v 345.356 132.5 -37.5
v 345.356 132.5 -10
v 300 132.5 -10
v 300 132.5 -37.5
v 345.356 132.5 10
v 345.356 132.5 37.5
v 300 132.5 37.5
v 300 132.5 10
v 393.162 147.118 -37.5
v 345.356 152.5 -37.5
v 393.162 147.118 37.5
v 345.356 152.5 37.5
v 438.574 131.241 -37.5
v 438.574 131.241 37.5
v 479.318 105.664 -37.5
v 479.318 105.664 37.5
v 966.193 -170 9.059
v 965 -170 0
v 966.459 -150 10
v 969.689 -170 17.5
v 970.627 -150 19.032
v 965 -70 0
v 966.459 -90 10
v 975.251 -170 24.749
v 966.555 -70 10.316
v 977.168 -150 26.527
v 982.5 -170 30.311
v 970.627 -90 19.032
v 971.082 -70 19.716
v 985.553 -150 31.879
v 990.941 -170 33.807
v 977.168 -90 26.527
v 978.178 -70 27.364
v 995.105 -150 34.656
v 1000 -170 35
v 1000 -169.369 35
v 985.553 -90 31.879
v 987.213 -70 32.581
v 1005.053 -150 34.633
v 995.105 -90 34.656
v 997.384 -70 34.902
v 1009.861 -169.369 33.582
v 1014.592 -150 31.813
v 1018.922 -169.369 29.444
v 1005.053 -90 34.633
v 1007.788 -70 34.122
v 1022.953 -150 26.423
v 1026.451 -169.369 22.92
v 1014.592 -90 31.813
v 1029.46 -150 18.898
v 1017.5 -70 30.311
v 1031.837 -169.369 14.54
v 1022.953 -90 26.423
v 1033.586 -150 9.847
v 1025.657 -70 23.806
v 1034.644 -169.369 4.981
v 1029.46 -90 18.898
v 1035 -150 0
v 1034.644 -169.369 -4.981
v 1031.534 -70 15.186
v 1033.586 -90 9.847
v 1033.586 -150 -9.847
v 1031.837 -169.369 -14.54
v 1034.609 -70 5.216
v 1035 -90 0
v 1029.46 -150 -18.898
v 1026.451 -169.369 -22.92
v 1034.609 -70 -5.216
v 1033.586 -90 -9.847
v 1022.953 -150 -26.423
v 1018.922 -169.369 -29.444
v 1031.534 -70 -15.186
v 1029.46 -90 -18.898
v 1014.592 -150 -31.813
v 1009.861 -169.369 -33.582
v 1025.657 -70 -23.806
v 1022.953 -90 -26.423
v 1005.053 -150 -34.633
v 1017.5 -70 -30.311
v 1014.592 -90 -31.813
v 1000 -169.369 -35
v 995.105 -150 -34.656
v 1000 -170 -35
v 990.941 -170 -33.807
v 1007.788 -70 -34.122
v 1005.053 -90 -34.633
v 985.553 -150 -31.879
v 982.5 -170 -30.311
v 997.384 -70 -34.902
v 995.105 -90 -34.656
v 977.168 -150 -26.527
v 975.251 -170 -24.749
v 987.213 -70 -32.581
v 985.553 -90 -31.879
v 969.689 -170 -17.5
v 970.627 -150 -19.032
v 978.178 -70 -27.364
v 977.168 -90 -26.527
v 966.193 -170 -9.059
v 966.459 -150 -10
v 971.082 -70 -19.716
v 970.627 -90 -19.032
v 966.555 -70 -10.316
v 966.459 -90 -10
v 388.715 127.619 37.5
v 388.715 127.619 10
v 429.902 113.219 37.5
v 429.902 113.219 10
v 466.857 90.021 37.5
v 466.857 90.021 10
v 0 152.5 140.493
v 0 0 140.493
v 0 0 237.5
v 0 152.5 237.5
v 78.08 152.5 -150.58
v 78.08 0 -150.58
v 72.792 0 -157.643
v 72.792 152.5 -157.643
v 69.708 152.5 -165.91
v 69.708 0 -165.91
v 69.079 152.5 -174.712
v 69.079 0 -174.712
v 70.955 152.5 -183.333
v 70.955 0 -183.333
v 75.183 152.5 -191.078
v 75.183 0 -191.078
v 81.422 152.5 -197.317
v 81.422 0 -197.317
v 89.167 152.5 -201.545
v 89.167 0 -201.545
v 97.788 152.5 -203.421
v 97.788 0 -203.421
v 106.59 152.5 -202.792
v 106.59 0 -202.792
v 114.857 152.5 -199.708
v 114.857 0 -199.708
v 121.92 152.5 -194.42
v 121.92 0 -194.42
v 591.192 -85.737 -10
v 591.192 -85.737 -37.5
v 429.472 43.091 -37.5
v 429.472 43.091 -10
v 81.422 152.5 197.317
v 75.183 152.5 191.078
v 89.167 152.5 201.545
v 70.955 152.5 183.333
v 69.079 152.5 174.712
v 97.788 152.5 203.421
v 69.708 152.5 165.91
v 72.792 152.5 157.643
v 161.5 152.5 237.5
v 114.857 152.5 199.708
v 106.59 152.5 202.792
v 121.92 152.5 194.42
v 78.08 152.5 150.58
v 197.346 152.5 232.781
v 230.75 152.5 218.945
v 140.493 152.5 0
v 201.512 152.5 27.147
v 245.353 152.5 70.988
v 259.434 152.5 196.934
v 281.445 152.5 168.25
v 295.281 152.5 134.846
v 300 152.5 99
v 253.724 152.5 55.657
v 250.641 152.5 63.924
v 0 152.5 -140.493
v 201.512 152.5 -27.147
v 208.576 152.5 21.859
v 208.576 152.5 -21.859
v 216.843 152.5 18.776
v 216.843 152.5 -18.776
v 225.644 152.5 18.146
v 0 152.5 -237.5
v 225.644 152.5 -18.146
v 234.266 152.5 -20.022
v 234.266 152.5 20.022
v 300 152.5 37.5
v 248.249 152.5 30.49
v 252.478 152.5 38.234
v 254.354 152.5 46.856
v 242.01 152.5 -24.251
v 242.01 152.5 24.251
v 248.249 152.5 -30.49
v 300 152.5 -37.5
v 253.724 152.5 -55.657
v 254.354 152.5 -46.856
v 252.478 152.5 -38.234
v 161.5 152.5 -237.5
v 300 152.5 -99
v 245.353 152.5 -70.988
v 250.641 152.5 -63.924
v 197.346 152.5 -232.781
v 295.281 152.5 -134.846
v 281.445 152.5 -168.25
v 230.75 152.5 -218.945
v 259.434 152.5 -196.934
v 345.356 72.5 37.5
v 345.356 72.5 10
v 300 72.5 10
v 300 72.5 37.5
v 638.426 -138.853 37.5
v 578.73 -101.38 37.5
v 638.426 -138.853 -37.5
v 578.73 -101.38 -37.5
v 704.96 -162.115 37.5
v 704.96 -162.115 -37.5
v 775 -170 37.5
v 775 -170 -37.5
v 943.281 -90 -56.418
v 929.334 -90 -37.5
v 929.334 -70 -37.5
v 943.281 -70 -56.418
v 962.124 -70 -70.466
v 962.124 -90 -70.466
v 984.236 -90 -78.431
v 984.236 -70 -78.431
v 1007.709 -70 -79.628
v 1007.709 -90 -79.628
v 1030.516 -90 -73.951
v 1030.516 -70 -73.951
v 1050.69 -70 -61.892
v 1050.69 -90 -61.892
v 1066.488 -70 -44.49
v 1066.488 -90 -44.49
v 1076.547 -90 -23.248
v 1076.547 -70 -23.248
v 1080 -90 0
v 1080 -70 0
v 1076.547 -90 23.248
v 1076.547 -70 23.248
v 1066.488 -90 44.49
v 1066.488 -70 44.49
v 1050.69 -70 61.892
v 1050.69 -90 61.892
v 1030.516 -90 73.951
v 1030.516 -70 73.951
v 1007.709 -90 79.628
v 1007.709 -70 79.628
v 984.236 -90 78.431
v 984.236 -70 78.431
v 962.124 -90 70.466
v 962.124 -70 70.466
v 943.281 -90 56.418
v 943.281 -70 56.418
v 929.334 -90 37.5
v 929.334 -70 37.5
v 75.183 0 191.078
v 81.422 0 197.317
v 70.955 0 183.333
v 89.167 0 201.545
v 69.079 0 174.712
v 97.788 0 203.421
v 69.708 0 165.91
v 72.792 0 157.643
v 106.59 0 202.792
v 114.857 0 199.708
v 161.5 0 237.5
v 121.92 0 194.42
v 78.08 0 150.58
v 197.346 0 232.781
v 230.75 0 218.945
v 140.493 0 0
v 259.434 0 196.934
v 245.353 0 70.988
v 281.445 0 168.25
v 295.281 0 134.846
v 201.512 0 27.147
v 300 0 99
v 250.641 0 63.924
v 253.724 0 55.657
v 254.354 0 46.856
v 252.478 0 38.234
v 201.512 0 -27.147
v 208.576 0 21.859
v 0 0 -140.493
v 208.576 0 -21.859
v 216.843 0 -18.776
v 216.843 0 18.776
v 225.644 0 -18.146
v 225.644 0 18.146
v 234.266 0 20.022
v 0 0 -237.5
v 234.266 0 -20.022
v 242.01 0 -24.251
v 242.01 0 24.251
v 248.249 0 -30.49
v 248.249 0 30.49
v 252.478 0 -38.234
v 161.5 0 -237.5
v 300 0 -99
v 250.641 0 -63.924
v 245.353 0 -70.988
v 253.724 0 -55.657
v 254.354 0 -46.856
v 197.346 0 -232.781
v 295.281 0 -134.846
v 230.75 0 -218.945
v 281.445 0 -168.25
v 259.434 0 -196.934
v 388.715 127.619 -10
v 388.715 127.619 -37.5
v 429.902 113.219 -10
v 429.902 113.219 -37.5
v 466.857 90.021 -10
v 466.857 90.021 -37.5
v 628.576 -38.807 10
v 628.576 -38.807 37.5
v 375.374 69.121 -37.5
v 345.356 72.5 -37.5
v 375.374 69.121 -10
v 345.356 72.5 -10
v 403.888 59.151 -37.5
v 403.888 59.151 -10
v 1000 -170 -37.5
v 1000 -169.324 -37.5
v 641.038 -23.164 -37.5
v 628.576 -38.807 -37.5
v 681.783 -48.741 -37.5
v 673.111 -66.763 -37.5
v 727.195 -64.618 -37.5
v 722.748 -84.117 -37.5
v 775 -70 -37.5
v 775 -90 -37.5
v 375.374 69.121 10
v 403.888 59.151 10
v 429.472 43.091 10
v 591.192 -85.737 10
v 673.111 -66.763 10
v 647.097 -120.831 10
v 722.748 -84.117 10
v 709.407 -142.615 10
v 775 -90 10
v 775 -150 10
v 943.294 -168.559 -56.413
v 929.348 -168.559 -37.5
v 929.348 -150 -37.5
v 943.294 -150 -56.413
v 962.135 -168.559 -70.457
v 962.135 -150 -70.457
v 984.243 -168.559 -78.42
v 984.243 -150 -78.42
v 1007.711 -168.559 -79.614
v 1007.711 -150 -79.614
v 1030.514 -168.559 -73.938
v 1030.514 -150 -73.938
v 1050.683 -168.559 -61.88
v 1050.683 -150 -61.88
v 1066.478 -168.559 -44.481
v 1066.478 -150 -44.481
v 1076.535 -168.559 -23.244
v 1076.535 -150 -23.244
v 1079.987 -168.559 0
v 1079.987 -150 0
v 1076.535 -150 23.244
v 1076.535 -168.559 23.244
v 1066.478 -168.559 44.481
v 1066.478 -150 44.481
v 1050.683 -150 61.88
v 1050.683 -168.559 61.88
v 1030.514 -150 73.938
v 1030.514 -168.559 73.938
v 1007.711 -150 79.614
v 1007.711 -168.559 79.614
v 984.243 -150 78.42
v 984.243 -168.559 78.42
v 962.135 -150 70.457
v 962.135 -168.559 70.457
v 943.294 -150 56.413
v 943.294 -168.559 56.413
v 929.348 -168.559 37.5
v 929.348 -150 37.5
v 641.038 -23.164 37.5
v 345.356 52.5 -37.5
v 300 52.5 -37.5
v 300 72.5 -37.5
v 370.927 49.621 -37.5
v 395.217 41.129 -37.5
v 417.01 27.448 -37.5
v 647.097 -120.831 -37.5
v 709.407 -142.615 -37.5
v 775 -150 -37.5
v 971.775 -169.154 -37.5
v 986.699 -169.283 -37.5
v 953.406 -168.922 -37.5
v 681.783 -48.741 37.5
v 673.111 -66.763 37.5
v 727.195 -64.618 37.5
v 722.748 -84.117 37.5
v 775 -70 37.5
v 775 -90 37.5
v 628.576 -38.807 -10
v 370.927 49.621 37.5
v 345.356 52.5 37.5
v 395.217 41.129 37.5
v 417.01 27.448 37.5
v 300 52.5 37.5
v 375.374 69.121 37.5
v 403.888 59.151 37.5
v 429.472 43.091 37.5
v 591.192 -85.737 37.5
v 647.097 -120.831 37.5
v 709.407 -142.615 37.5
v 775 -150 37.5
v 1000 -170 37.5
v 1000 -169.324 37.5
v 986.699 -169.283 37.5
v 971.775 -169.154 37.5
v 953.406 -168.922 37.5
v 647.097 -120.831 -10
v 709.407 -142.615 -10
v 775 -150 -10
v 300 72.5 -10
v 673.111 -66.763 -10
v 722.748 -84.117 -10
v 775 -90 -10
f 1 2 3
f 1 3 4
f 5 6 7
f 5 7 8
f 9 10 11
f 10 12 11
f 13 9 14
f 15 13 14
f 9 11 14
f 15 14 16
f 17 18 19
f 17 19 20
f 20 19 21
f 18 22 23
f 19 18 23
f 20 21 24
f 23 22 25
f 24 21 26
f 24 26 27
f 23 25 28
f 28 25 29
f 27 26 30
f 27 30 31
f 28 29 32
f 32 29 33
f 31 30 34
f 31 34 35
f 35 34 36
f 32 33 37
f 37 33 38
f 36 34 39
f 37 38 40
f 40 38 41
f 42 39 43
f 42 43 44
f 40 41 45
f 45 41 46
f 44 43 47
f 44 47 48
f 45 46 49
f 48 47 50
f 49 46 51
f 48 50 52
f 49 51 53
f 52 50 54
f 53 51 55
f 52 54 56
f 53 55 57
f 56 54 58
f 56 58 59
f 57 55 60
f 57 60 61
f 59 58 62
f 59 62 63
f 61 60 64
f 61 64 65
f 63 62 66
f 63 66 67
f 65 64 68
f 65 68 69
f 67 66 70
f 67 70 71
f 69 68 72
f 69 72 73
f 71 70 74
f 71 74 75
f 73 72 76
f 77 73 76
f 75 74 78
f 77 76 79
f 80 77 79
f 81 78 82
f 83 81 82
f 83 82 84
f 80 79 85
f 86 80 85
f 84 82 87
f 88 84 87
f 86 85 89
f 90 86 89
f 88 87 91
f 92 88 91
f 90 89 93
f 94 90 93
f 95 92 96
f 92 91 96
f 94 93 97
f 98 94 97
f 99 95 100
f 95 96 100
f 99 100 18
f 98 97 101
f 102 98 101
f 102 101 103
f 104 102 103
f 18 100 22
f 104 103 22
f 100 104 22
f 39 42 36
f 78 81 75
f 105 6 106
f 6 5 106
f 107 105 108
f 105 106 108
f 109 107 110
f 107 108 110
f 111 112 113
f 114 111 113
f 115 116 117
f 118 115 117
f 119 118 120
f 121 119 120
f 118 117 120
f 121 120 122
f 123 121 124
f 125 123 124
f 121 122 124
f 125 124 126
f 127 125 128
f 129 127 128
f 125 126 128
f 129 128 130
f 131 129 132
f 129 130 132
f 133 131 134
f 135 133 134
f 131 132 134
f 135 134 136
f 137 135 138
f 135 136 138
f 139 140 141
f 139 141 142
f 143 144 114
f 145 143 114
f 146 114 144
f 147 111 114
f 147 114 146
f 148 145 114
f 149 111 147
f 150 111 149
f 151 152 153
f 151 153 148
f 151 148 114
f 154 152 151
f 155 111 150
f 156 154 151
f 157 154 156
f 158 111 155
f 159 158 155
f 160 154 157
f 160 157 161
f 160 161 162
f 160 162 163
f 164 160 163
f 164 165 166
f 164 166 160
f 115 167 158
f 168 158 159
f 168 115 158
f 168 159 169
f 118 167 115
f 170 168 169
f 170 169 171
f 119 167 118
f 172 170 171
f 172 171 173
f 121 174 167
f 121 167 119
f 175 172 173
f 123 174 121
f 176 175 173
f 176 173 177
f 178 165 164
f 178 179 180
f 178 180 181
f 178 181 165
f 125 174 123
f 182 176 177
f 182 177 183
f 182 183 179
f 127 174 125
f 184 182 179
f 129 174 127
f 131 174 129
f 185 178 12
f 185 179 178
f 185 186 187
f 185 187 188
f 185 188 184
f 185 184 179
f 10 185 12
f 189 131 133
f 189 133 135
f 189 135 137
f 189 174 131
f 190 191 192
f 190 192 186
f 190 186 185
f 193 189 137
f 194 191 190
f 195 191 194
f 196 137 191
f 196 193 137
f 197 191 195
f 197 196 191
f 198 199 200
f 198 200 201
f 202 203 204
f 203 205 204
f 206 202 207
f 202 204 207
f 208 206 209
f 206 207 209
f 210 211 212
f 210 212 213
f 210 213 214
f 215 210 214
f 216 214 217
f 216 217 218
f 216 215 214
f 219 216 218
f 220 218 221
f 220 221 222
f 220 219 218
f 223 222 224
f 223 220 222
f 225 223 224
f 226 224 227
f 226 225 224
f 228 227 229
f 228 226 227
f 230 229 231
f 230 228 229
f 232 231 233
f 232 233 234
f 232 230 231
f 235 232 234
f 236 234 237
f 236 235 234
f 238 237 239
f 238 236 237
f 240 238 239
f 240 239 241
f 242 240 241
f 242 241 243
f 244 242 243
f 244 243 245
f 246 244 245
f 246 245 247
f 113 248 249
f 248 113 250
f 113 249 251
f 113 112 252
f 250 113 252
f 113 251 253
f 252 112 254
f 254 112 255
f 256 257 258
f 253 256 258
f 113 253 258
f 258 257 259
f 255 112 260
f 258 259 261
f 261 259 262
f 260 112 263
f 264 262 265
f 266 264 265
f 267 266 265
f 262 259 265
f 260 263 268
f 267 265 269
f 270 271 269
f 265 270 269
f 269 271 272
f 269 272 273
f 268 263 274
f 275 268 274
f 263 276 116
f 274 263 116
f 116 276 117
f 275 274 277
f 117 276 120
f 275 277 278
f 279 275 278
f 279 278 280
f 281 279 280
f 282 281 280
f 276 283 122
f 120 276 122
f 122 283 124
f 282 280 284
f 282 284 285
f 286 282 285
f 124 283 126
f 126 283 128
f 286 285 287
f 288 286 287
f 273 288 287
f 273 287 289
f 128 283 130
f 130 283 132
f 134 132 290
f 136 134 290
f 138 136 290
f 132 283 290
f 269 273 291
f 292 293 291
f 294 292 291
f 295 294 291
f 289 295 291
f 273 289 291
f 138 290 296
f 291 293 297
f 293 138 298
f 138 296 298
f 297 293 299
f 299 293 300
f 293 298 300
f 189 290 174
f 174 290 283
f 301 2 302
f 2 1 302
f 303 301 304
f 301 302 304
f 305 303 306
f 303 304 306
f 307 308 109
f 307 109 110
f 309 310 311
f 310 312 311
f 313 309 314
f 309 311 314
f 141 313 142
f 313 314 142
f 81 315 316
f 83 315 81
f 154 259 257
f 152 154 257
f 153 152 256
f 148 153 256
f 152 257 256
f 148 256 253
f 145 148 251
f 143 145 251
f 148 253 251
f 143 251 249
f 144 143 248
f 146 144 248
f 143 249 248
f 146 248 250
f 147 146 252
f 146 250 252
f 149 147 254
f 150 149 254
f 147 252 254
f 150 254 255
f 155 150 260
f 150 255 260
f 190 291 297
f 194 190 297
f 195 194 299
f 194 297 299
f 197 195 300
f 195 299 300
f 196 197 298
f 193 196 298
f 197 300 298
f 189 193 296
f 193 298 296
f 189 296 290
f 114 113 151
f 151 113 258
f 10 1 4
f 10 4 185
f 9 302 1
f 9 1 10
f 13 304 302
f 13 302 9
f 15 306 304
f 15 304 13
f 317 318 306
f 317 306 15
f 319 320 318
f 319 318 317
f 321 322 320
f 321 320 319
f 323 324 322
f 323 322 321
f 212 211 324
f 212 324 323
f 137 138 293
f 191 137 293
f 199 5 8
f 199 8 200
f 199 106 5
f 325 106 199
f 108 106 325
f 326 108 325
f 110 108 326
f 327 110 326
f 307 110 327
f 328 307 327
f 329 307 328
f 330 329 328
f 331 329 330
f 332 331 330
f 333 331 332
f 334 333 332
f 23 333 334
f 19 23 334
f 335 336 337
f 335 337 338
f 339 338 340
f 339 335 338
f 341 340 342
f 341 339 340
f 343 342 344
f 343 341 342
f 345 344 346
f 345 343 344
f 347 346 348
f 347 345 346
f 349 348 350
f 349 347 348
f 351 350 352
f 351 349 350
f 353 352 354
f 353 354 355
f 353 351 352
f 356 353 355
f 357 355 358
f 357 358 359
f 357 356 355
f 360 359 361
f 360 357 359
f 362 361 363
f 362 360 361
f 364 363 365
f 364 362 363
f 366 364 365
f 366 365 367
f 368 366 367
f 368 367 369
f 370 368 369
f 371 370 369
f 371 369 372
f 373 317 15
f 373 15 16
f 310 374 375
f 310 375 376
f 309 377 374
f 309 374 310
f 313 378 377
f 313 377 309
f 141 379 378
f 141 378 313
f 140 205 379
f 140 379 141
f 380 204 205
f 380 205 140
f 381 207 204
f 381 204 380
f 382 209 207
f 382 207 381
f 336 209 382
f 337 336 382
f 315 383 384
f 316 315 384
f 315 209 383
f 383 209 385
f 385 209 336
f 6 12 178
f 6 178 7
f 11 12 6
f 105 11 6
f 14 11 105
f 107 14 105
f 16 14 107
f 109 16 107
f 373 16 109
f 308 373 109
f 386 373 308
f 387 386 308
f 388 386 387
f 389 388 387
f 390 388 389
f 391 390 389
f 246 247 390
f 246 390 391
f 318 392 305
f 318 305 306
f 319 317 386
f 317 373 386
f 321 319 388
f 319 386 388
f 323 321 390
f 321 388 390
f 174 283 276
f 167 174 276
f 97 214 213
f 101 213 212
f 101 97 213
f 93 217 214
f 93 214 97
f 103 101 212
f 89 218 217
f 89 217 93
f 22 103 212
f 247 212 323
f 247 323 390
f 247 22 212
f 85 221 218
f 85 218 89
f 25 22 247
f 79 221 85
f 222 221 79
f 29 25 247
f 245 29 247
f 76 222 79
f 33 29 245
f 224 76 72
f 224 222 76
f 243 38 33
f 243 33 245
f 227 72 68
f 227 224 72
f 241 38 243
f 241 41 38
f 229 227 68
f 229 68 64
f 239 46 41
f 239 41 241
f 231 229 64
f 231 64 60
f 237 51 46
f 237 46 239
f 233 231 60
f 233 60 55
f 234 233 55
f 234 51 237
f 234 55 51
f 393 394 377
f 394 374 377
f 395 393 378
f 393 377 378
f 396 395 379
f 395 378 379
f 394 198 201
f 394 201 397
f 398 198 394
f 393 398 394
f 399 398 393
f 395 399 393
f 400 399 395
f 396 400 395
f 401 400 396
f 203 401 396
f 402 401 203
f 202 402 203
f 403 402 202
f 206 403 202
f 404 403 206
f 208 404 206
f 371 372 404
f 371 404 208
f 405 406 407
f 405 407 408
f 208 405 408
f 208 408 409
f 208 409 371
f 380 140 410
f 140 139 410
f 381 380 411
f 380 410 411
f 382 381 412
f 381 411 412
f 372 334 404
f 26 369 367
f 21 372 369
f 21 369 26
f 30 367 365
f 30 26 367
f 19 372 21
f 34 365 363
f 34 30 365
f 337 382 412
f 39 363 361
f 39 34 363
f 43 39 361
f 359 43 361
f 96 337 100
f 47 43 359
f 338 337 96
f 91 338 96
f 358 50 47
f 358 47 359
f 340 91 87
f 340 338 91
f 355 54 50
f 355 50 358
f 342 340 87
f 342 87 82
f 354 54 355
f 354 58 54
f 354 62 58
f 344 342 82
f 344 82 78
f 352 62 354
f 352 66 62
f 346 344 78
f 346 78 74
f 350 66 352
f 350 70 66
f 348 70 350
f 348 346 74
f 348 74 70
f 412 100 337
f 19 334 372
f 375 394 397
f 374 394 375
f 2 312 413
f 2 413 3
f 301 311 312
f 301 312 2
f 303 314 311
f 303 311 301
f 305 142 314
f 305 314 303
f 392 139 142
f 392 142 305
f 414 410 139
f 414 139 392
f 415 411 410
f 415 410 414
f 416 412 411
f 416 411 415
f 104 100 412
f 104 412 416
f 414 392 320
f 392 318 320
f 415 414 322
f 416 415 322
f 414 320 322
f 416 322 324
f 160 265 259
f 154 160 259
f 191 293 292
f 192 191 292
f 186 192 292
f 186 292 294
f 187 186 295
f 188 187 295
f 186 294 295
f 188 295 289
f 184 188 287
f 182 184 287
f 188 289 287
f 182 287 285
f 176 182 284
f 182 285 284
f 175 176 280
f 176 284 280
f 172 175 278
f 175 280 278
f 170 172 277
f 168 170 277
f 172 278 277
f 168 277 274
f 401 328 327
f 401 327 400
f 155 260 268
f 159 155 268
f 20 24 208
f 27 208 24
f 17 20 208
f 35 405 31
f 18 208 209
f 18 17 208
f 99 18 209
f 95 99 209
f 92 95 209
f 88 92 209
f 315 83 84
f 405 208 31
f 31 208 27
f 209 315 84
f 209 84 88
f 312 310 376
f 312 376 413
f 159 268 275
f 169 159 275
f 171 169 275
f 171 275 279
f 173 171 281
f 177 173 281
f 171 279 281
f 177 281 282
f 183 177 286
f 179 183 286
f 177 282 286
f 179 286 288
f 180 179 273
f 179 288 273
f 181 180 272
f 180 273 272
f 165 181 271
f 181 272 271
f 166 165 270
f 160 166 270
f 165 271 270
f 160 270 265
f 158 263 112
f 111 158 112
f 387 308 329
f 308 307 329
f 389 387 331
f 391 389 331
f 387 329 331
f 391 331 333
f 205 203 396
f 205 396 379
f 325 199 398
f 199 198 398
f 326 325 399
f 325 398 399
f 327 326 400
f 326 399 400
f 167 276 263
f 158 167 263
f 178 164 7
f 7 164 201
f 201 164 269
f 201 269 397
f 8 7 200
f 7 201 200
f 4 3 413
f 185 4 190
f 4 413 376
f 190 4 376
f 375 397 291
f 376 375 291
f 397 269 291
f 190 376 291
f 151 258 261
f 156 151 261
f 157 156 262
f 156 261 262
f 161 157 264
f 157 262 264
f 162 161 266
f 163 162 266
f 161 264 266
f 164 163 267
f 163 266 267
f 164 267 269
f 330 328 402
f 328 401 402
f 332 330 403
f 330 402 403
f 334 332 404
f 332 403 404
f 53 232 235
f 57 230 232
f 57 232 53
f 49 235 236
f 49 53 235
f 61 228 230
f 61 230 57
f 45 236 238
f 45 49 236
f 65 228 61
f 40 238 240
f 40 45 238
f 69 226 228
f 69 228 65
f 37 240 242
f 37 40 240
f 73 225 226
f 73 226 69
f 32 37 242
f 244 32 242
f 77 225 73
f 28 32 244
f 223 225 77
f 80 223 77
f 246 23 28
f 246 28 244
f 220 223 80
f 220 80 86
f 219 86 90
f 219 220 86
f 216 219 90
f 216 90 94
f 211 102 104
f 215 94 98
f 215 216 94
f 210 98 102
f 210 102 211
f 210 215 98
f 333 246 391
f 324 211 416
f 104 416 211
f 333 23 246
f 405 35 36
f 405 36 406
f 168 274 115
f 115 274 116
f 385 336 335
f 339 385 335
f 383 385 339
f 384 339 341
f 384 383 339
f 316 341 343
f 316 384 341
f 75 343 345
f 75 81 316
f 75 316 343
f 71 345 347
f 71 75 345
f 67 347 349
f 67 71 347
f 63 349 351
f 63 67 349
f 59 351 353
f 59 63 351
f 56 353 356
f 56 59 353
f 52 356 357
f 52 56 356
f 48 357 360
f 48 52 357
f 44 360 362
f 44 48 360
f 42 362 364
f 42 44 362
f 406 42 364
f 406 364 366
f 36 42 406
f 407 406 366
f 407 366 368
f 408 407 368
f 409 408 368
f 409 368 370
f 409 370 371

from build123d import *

# Parameters (mm, degrees)
BOSS_EXTRUDE1_DEPTH = 152.5
SKETCH9_R           = 35
CUT_EXTRUDE1_DEPTH  = 152.5


with BuildPart() as part:
    # Sketch1 → Boss-Extrude1 (new body)
    # profile 1 of 2: a face of its own
    with BuildSketch(Plane(origin=(0, 0, 0), x_dir=(1, 0, 0), z_dir=(0, 1, 0))):
        with BuildLine():
            Line((300, 0), (140.492545905, 0))
            Line((140.492545905, 0), (0, -140.492545905))
            Line((0, -140.492545905), (0, -237.5))
            Line((0, -237.5), (161.5, -237.5))
            ThreePointArc((161.5, -237.5), (259.434289194, -196.934289194), (300, -99))
            Line((300, -99), (300, 0))
        make_face()
        with BuildLine():
            Line((245.352869941, -70.987750493), (121.920310217, -194.420310217))
            ThreePointArc((121.920310217, -194.420310217), (78.079689783, -194.420310217), (78.079689783, -150.579689783))
            Line((78.079689783, -150.579689783), (201.512249507, -27.147130059))
            ThreePointArc((201.512249507, -27.147130059), (245.352869941, -27.147130059), (245.352869941, -70.987750493))
        make_face(mode=Mode.SUBTRACT)
    # profile 2 of 2: a face of its own
    with BuildSketch(Plane(origin=(0, 0, 0), x_dir=(1, 0, 0), z_dir=(0, 1, 0))):
        with BuildLine():
            Line((0, 237.5), (0, 140.492545905))
            Line((0, 140.492545905), (140.492545905, 0))
            Line((140.492545905, 0), (300, 0))
            Line((300, 0), (300, 99))
            ThreePointArc((300, 99), (259.434289194, 196.934289194), (161.5, 237.5))
            Line((161.5, 237.5), (0, 237.5))
        make_face()
        with BuildLine():
            ThreePointArc((78.079689783, 150.579689783), (78.079689783, 194.420310217), (121.920310217, 194.420310217))
            Line((121.920310217, 194.420310217), (245.352869941, 70.987750493))
            ThreePointArc((245.352869941, 70.987750493), (245.352869941, 27.147130059), (201.512249507, 27.147130059))
            Line((201.512249507, 27.147130059), (78.079689783, 150.579689783))
        make_face(mode=Mode.SUBTRACT)
    extrude(amount=BOSS_EXTRUDE1_DEPTH)

    # Sweep2: sweep along a path in Sketch2
    with BuildLine(Plane.XY) as sweep2_path:
        Line((300, 152.5), (345.356342374, 152.5))
        ThreePointArc((345.356342374, 152.5), (416.313076896, 140.45354598), (479.318397094, 105.664110009))
        Line((479.318397094, 105.664110009), (641.03794528, -23.164110009))
        ThreePointArc((641.03794528, -23.164110009), (704.043265478, -57.95354598), (775, -70))
        Line((775, -70), (1000, -70))
    # Sketch3 → Sweep2 (sweep)
    with BuildSketch(Plane(origin=(300, 0, 0), x_dir=(0, 0, -1), z_dir=(1, 0, 0))):
        Polygon((-37.5, 152.5), (37.5, 152.5), (37.5, 132.5), (10, 132.5), (10, 72.5), (37.5, 72.5), (37.5, 52.5), (-37.5, 52.5), (-37.5, 72.5), (-10, 72.5), (-10, 132.5), (-37.5, 132.5), align=None)
    sweep(path=sweep2_path.line)

    # Sketch7 → Revolve2 (revolve)
    with BuildSketch(Plane(origin=(0, 0, 0), x_dir=(-1, 0, 0), z_dir=(0, 0, -1))):
        Polygon((-920, -70), (-920, -90), (-990, -90), (-990, -150), (-920.012979842, -150), (-920.012979842, -168.558956517), (-1000, -170), (-1000, -70), align=None)
    revolve(axis=Axis((1000, -43.921847772, 0), (0, -1, 0)))

    # Sketch9 → Cut-Extrude1 (cut)
    with BuildSketch(Plane(origin=(0, -70, 0), x_dir=(1, 0, 0), z_dir=(0, 1, 0))):
        with Locations(Location((1000, 0, 0), (0, 0, 180))):
            Circle(SKETCH9_R)
    extrude(amount=-CUT_EXTRUDE1_DEPTH, mode=Mode.SUBTRACT)


solid = part.part
